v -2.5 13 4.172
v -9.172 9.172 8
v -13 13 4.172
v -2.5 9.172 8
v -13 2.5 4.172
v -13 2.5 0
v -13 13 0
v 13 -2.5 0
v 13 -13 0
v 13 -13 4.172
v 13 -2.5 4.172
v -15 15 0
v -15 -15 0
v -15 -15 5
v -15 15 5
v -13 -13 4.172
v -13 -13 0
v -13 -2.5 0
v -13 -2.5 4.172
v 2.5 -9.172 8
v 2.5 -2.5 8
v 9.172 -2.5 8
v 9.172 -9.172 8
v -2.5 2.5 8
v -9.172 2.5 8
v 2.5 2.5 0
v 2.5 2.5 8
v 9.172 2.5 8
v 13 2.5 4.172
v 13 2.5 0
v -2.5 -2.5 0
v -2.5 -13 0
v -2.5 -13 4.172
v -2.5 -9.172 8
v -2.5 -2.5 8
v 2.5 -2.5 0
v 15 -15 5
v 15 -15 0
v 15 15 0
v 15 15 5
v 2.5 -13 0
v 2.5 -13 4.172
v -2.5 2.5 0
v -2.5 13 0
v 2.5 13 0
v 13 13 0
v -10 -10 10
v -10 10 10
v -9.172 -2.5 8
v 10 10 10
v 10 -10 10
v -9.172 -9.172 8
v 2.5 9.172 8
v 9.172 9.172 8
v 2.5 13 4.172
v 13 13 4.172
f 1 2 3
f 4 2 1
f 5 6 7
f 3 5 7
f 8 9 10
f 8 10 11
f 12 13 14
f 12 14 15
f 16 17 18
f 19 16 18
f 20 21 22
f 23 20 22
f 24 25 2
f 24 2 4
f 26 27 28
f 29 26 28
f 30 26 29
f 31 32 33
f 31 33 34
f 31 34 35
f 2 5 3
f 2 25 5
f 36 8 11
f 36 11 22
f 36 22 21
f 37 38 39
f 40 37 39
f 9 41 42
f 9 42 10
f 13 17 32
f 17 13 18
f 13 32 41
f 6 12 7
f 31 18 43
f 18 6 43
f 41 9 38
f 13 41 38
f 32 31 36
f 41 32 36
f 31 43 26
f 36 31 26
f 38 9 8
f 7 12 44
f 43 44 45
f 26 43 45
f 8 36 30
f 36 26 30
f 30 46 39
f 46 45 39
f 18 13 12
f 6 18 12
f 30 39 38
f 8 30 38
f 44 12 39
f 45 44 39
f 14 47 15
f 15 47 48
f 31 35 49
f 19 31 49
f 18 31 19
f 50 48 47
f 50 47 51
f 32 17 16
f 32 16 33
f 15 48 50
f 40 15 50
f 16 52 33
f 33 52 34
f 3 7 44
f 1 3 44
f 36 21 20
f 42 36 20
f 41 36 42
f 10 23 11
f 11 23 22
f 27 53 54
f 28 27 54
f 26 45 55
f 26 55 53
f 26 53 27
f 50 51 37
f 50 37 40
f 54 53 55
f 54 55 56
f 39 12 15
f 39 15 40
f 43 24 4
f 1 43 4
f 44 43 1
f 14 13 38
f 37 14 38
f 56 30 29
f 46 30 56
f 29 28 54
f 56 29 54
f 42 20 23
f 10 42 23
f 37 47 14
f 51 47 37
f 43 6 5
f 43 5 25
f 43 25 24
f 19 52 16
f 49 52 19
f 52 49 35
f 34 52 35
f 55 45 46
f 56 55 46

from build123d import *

# Parameters (mm, degrees)
SKETCH1_W           = 30
SKETCH1_H           = 30
BOSS_EXTRUDE1_DEPTH = 10
CHAMFER1_SIZE       = 5
SHELL1_T            = -2
BOSS_EXTRUDE2_REACH = 12


with BuildPart() as part:
    # Sketch1 → Boss-Extrude1 (new body)
    with BuildSketch(Plane.XY):
        Rectangle(SKETCH1_W, SKETCH1_H)
    extrude(amount=BOSS_EXTRUDE1_DEPTH)

    # Chamfer1
    chamfer1_edges = [part.edges().sort_by_distance(p)[0] for p in [
        (-15, 0, 10),
        (0, -15, 10),
        (15, 0, 10),
        (0, 15, 10),
    ]]
    chamfer(chamfer1_edges, length=CHAMFER1_SIZE)

    # Shell1
    shell1_openings = [part.faces().sort_by_distance(p)[0] for p in [
        (0, 0, 0),
    ]]
    offset(amount=SHELL1_T, openings=shell1_openings, kind=Kind.INTERSECTION)

    # Sketch2 → Boss-Extrude2 (add, up to next)
    with BuildSketch(Plane(origin=(0, 0, 0), x_dir=(-1, 0, 0), z_dir=(0, 0, -1)), mode=Mode.PRIVATE) as boss_extrude2_sk1:
        Polygon((13, 2.5), (2.5, 2.5), (2.5, 13), (-2.5, 13), (-2.5, 2.5), (-13, 2.5), (-13, -2.5), (-2.5, -2.5), (-2.5, -13), (2.5, -13), (2.5, -2.5), (13, -2.5), align=None)
    boss_extrude2_tool1 = extrude(boss_extrude2_sk1.sketch, amount=-BOSS_EXTRUDE2_REACH, mode=Mode.PRIVATE) - part.part
    add(boss_extrude2_tool1.solids().sort_by_distance((0, 0, 0))[0])


solid = part.part
